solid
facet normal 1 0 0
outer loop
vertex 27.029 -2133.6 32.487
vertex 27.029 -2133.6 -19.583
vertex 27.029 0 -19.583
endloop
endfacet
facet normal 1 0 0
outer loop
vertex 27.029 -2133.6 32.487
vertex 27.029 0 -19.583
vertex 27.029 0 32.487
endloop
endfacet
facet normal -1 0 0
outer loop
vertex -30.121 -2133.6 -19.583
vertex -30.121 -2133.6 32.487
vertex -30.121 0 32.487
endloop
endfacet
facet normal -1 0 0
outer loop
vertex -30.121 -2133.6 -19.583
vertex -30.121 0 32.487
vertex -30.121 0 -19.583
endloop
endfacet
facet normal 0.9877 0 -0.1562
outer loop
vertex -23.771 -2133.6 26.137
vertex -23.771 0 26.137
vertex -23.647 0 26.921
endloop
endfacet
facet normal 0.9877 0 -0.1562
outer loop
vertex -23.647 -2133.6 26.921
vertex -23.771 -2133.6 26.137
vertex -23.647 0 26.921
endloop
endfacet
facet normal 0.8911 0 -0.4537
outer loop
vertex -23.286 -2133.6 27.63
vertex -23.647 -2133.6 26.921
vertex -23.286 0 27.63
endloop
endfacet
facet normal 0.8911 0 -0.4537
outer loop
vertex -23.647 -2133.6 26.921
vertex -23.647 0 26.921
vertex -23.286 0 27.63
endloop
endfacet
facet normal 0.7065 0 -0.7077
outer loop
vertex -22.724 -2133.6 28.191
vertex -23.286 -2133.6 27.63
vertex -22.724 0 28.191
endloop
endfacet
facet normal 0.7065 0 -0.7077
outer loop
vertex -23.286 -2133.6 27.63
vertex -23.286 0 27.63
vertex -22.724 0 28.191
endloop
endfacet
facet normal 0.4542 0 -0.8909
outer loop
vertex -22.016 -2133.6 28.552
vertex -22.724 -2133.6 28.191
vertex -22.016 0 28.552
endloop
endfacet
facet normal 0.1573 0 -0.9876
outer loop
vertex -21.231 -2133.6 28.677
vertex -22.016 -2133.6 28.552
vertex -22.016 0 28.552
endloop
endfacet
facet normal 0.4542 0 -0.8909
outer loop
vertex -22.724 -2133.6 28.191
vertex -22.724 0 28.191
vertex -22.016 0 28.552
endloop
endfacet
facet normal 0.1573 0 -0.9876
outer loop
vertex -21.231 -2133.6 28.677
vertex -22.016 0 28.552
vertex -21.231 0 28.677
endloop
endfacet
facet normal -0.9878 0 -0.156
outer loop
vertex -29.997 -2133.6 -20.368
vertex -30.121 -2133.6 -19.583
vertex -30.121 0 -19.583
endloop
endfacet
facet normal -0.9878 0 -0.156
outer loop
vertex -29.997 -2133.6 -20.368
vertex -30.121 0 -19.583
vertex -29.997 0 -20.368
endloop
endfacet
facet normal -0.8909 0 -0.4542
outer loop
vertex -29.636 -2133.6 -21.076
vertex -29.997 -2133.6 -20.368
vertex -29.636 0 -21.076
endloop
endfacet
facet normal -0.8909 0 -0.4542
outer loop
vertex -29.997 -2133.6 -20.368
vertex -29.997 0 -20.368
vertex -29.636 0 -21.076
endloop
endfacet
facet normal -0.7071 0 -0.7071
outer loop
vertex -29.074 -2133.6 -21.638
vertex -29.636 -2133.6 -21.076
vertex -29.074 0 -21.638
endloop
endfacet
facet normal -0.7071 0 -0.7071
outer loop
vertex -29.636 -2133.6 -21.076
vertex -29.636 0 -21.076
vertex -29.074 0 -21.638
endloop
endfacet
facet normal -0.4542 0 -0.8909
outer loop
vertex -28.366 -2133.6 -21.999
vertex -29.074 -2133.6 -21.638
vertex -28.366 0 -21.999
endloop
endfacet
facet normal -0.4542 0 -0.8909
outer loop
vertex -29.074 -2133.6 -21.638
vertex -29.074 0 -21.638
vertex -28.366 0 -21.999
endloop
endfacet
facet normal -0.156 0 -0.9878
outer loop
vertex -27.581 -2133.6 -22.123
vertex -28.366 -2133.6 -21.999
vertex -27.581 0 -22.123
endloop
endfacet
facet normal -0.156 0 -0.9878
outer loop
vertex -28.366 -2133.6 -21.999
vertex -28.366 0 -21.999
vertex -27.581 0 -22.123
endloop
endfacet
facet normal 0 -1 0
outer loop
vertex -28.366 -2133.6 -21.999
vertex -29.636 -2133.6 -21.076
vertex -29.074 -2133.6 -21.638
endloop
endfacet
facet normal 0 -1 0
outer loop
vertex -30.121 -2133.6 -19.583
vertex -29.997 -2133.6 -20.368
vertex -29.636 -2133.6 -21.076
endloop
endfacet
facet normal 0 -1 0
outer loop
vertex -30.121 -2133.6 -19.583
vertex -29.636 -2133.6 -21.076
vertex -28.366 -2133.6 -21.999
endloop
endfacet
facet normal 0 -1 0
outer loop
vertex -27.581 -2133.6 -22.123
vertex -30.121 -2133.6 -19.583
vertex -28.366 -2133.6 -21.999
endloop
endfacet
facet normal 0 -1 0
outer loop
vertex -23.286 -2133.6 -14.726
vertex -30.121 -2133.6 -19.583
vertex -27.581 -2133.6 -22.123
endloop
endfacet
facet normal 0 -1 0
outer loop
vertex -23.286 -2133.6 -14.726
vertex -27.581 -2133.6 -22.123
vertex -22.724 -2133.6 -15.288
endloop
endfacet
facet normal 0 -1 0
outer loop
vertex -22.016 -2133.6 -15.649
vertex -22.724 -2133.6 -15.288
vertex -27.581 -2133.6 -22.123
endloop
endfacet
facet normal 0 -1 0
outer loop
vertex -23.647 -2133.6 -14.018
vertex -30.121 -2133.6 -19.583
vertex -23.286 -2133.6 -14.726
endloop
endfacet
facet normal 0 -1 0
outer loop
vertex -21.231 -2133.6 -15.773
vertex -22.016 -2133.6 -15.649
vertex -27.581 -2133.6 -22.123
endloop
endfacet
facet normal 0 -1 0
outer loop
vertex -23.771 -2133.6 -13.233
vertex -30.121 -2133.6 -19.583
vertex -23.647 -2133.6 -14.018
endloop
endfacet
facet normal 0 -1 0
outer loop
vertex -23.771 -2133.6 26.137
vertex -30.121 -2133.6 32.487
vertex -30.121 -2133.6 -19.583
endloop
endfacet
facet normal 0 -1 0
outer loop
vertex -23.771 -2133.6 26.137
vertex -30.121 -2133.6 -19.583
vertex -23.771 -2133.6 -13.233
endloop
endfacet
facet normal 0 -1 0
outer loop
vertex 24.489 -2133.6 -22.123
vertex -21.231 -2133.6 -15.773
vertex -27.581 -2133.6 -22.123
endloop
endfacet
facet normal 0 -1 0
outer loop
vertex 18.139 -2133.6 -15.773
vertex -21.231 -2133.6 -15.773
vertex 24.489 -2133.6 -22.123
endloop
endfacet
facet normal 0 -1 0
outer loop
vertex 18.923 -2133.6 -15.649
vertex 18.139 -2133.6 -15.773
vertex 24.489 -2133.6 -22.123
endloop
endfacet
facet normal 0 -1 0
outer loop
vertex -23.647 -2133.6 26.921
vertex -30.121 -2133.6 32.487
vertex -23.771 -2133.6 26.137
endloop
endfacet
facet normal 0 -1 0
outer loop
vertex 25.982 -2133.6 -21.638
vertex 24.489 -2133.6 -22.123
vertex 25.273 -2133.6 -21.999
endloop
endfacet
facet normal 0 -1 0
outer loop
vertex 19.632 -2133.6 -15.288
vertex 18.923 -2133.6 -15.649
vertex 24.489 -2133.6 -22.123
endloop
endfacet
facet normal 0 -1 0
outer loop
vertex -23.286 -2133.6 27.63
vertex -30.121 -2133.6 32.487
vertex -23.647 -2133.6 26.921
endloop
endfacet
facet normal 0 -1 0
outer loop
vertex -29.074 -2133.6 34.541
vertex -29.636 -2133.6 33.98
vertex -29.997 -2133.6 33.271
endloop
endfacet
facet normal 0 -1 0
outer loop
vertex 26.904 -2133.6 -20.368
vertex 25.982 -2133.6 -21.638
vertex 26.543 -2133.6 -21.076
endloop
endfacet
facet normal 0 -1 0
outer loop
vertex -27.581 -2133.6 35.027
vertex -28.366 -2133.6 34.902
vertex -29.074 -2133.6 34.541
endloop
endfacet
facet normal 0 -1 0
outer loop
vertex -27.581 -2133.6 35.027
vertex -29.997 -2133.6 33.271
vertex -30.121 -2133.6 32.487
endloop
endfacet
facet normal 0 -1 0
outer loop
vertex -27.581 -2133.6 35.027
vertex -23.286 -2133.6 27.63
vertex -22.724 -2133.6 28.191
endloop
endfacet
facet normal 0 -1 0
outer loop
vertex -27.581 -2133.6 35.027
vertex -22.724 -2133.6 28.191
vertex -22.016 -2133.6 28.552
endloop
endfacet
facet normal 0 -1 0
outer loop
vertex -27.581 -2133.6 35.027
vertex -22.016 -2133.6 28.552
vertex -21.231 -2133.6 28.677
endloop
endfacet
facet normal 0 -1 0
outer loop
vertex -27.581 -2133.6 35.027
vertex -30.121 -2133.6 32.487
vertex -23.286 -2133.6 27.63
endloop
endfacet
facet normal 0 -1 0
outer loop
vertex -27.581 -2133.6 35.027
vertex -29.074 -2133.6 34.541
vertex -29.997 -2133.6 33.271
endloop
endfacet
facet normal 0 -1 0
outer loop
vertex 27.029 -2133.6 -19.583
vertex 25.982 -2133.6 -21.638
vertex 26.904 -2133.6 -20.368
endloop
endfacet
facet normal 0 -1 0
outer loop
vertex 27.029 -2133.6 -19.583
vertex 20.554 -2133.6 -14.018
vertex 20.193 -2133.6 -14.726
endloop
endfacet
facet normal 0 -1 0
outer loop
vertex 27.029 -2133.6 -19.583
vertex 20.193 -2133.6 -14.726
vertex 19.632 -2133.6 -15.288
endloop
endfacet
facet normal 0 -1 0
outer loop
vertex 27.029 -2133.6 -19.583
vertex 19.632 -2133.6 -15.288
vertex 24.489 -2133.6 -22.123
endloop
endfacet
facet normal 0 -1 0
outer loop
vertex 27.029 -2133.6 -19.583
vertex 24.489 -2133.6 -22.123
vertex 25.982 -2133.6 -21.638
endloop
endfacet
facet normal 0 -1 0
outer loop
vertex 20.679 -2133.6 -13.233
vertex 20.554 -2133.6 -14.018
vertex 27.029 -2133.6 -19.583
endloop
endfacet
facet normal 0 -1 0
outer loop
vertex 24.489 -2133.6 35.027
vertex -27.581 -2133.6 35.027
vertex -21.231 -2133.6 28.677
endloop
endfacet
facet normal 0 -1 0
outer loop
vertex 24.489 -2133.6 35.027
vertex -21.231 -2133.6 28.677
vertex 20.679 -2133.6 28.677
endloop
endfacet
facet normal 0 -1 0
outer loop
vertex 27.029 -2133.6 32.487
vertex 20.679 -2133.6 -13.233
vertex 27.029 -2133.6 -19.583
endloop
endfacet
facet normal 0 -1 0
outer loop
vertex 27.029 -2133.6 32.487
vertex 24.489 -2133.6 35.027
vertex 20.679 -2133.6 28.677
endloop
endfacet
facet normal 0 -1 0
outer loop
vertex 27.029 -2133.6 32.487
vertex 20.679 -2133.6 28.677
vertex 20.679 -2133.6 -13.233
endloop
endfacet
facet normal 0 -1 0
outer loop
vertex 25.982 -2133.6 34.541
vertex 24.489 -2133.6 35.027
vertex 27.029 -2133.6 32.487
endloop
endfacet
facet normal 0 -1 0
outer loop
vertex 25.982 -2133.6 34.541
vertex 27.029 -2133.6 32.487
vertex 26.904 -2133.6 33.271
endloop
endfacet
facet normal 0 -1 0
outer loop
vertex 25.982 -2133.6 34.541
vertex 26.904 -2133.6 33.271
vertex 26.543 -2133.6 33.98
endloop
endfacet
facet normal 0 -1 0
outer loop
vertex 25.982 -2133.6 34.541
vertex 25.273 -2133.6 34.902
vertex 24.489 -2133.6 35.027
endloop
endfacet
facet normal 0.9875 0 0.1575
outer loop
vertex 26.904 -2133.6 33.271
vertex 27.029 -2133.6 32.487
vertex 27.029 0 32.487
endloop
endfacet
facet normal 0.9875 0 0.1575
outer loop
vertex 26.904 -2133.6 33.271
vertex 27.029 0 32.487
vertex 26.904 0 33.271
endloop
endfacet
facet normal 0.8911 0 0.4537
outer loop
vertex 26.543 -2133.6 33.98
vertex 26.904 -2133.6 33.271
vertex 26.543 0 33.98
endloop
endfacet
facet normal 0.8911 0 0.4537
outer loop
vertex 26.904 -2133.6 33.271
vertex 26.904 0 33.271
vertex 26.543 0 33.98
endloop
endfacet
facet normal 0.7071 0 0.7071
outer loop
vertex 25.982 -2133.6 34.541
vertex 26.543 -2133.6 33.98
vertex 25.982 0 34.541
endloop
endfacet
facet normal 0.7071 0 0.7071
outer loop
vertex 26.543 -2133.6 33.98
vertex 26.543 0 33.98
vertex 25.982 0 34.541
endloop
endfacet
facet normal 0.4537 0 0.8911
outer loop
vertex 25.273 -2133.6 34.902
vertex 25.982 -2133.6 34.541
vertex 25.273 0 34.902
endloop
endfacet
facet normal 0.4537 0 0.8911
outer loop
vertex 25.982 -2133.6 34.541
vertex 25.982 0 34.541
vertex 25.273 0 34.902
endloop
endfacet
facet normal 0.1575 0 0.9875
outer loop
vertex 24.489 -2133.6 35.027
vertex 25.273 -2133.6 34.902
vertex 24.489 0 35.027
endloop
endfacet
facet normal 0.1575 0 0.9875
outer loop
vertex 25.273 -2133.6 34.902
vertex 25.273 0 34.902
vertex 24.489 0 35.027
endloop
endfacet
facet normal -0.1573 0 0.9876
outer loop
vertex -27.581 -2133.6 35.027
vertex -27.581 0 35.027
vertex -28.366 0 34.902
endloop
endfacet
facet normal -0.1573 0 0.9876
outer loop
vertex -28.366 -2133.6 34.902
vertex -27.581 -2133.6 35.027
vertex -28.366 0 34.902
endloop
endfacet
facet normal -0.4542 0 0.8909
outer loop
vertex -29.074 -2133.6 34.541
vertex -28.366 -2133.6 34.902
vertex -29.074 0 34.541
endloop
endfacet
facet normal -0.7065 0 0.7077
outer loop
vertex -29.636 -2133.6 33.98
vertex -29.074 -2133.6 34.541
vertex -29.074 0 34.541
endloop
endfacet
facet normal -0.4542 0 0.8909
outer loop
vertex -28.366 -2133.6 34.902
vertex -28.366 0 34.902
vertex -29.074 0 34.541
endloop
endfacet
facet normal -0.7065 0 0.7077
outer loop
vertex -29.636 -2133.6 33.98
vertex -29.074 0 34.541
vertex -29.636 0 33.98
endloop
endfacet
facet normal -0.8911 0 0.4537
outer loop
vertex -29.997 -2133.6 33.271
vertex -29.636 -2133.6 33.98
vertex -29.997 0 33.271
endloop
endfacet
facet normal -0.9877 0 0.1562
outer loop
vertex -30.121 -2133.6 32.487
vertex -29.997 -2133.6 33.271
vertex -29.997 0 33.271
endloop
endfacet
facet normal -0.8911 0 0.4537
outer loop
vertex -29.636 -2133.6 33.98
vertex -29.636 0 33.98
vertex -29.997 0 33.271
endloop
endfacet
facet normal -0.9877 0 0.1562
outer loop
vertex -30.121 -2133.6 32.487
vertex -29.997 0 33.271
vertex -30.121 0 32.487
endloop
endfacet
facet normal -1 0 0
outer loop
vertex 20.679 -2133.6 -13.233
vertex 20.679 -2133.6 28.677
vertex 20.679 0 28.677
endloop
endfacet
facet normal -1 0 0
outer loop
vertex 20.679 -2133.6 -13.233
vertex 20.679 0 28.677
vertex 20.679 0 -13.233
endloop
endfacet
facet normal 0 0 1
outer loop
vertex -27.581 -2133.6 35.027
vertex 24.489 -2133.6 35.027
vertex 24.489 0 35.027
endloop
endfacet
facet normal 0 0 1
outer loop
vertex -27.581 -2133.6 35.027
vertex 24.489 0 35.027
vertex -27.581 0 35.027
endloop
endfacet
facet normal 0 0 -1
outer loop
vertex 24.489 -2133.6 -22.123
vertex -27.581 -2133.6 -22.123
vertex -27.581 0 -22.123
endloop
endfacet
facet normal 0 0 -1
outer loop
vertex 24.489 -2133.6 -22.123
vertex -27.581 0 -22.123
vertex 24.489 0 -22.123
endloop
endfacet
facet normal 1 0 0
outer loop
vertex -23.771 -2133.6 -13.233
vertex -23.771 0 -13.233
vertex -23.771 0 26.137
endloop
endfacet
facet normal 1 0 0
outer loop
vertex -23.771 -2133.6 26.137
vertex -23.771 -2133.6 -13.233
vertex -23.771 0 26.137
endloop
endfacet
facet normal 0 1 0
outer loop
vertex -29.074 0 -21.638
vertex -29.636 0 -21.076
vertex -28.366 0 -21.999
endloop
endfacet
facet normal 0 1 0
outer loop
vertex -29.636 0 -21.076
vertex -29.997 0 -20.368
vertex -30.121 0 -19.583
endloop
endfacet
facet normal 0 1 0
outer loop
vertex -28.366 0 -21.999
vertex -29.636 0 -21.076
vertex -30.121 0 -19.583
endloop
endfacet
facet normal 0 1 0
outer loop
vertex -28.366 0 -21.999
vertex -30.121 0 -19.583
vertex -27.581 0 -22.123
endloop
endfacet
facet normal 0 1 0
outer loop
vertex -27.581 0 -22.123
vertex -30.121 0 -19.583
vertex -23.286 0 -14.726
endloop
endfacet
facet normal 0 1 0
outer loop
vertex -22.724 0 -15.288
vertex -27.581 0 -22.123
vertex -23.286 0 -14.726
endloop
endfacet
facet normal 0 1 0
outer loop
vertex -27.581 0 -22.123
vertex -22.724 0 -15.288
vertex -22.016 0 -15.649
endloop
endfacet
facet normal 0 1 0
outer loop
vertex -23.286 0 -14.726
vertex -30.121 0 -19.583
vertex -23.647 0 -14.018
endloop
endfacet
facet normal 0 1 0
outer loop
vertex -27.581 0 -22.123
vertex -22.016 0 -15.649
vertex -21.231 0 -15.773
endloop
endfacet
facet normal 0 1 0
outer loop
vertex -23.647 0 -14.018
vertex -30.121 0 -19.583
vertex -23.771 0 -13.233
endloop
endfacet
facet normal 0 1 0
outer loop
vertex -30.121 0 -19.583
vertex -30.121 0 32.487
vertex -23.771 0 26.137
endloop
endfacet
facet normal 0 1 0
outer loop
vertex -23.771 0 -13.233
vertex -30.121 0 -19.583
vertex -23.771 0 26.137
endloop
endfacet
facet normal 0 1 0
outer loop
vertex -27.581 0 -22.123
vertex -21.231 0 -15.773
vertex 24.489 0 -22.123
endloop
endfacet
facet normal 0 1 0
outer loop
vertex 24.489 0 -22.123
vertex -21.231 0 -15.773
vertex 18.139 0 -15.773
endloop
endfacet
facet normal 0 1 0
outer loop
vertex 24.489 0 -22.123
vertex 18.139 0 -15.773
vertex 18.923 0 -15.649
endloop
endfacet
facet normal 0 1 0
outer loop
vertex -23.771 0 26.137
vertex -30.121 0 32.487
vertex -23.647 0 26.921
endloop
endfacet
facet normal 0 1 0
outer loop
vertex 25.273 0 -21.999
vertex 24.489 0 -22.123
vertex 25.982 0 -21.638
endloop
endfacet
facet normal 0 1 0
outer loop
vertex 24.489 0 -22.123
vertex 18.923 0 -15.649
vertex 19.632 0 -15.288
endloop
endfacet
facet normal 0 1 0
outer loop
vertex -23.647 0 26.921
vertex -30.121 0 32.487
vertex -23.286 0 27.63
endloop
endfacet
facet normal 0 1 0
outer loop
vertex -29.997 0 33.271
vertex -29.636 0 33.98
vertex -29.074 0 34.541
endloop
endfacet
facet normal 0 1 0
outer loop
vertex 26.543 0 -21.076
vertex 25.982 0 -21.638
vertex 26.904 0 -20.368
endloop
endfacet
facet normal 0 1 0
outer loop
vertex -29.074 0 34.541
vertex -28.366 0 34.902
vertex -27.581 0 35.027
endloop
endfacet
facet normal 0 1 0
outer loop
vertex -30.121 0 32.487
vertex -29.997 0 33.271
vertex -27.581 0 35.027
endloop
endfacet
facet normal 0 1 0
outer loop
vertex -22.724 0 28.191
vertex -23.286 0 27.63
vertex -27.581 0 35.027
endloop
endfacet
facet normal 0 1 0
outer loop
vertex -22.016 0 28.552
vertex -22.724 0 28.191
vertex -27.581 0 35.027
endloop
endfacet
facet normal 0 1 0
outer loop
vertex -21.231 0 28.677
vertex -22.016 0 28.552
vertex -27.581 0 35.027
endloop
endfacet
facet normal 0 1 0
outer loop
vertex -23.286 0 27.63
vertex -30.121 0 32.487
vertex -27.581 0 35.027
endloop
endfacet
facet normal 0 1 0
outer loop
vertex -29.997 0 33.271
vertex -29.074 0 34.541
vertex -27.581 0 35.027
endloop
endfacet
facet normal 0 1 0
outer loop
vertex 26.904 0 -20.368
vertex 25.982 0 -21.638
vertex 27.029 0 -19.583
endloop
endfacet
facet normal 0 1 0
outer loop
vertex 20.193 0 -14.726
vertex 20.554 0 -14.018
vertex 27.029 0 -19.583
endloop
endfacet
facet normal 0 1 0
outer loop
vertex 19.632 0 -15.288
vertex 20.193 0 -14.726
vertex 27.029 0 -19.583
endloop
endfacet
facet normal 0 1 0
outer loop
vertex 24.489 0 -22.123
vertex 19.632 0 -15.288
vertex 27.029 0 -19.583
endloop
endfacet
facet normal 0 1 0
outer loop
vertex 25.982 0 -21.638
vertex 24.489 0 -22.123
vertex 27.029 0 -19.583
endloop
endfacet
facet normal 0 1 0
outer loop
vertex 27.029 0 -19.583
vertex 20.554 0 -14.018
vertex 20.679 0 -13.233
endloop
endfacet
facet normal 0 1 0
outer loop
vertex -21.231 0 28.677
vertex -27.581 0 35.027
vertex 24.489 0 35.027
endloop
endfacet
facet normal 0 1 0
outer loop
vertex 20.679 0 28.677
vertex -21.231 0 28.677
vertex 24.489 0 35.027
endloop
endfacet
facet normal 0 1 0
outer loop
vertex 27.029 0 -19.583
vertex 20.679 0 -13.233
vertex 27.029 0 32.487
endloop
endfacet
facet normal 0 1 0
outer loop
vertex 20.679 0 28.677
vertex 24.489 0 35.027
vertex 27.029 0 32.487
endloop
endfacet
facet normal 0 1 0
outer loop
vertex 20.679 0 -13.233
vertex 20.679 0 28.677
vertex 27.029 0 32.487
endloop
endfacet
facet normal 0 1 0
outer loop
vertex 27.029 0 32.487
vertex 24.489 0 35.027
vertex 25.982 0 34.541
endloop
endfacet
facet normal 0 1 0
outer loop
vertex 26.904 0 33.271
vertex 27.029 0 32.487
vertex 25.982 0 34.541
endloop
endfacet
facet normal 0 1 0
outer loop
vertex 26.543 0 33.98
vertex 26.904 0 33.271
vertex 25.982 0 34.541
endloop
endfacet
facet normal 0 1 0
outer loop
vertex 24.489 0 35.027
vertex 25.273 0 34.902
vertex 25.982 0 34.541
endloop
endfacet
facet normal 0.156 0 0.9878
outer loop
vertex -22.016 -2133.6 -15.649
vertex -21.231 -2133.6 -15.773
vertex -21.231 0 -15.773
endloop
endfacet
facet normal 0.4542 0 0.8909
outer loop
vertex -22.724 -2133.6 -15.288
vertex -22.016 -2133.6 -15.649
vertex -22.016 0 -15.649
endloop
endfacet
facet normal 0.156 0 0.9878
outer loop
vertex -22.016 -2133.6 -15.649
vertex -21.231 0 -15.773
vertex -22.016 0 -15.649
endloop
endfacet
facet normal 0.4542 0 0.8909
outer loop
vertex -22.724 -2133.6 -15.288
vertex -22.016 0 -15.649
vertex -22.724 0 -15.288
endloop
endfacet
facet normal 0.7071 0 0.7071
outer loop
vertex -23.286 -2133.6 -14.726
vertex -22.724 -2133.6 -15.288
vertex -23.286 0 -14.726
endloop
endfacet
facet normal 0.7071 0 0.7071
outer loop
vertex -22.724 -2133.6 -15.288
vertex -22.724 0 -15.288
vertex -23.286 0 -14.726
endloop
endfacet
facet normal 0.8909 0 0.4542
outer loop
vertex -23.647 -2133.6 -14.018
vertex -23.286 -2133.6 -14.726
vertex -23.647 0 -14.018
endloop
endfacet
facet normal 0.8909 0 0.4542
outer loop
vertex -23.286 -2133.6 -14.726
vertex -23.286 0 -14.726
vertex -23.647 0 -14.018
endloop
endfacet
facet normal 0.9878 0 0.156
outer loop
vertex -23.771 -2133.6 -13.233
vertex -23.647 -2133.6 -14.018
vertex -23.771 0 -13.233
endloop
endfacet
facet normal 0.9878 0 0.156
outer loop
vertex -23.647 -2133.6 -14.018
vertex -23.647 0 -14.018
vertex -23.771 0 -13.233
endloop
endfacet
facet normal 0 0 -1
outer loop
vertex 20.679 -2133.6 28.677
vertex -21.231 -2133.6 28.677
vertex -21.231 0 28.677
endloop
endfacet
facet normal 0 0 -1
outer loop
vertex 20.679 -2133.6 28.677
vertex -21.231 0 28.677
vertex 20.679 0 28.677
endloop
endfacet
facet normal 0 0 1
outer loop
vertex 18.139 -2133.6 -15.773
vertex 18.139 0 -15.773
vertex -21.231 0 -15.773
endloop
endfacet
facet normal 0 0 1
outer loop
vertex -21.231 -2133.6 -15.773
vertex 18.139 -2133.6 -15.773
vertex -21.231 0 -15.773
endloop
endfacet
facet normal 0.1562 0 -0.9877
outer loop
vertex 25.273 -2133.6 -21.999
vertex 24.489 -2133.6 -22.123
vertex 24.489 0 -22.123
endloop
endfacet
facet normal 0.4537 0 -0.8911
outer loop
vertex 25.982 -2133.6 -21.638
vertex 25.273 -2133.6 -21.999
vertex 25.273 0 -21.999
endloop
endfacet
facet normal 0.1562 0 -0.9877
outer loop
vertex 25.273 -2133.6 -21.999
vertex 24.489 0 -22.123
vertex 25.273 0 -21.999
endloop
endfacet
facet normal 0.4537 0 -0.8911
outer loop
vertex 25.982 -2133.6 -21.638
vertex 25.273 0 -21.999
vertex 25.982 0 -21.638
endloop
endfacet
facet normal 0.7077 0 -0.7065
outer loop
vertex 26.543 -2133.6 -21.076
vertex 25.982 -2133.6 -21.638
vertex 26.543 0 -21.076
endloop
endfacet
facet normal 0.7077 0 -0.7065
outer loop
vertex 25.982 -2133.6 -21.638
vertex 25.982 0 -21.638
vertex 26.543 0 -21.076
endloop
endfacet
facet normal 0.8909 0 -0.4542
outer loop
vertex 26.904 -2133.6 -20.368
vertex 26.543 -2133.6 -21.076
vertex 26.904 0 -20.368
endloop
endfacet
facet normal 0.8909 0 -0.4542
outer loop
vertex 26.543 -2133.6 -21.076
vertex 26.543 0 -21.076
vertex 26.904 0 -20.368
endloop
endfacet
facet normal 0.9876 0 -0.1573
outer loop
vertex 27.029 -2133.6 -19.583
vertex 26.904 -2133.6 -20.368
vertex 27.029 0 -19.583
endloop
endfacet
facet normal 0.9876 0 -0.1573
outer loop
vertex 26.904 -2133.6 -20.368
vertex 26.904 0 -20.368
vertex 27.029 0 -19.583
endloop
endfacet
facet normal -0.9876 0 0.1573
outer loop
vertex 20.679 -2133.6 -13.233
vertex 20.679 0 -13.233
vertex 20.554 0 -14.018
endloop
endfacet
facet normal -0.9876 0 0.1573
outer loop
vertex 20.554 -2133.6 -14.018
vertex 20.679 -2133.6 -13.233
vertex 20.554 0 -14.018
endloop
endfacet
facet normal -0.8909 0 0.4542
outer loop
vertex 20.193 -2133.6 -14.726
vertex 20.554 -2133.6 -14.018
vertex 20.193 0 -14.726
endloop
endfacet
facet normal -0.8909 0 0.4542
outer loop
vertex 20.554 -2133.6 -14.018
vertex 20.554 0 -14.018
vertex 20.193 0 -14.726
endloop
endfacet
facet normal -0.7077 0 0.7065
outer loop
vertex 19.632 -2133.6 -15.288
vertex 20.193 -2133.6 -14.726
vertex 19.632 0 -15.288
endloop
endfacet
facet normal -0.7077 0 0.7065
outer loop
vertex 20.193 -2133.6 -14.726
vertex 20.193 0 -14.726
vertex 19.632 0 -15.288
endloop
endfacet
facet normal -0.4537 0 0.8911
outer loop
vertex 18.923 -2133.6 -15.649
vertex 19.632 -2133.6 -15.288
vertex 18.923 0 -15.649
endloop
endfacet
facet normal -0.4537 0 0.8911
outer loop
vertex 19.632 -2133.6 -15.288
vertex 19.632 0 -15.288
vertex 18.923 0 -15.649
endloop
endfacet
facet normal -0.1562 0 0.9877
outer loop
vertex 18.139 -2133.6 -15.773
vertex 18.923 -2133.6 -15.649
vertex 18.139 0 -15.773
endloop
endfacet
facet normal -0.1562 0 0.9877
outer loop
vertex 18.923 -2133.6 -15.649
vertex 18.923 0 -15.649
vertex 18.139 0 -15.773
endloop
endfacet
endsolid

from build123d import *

# Parameters (mm, degrees)
F1_DEPTH = 2133.6


with BuildPart() as f1:
    # F0 (on Front) → F1 (new body)
    with BuildSketch(Plane.XZ):
        with BuildLine():
            Line((24.488532, 35.02659), (-27.581468, 35.02659))
            ThreePointArc((-27.581468, 35.02659), (-29.377519, 34.282641), (-30.121468, 32.48659))
            Line((-30.121468, 32.48659), (-30.121468, -19.58341))
            ThreePointArc((-30.121468, -19.58341), (-29.377519, -21.379462), (-27.581468, -22.12341))
            Line((-27.581468, -22.12341), (24.488532, -22.12341))
            ThreePointArc((24.488532, -22.12341), (26.284584, -21.379462), (27.028532, -19.58341))
            Line((27.028532, -19.58341), (27.028532, 32.48659))
            ThreePointArc((27.028532, 32.48659), (26.284584, 34.282641), (24.488532, 35.02659))
        make_face()
        with BuildLine():
            ThreePointArc((-23.771468, 26.13659), (-23.027519, 27.932641), (-21.231468, 28.67659))
            Line((-21.231468, 28.67659), (20.678532, 28.67659))
            Line((20.678532, 28.67659), (20.678532, -13.23341))
            ThreePointArc((20.678532, -13.23341), (19.934584, -15.029462), (18.138532, -15.77341))
            Line((18.138532, -15.77341), (-21.231468, -15.77341))
            ThreePointArc((-21.231468, -15.77341), (-23.027519, -15.029462), (-23.771468, -13.23341))
            Line((-23.771468, -13.23341), (-23.771468, 26.13659))
        make_face(mode=Mode.SUBTRACT)
    extrude(amount=F1_DEPTH)


solid = f1.part
